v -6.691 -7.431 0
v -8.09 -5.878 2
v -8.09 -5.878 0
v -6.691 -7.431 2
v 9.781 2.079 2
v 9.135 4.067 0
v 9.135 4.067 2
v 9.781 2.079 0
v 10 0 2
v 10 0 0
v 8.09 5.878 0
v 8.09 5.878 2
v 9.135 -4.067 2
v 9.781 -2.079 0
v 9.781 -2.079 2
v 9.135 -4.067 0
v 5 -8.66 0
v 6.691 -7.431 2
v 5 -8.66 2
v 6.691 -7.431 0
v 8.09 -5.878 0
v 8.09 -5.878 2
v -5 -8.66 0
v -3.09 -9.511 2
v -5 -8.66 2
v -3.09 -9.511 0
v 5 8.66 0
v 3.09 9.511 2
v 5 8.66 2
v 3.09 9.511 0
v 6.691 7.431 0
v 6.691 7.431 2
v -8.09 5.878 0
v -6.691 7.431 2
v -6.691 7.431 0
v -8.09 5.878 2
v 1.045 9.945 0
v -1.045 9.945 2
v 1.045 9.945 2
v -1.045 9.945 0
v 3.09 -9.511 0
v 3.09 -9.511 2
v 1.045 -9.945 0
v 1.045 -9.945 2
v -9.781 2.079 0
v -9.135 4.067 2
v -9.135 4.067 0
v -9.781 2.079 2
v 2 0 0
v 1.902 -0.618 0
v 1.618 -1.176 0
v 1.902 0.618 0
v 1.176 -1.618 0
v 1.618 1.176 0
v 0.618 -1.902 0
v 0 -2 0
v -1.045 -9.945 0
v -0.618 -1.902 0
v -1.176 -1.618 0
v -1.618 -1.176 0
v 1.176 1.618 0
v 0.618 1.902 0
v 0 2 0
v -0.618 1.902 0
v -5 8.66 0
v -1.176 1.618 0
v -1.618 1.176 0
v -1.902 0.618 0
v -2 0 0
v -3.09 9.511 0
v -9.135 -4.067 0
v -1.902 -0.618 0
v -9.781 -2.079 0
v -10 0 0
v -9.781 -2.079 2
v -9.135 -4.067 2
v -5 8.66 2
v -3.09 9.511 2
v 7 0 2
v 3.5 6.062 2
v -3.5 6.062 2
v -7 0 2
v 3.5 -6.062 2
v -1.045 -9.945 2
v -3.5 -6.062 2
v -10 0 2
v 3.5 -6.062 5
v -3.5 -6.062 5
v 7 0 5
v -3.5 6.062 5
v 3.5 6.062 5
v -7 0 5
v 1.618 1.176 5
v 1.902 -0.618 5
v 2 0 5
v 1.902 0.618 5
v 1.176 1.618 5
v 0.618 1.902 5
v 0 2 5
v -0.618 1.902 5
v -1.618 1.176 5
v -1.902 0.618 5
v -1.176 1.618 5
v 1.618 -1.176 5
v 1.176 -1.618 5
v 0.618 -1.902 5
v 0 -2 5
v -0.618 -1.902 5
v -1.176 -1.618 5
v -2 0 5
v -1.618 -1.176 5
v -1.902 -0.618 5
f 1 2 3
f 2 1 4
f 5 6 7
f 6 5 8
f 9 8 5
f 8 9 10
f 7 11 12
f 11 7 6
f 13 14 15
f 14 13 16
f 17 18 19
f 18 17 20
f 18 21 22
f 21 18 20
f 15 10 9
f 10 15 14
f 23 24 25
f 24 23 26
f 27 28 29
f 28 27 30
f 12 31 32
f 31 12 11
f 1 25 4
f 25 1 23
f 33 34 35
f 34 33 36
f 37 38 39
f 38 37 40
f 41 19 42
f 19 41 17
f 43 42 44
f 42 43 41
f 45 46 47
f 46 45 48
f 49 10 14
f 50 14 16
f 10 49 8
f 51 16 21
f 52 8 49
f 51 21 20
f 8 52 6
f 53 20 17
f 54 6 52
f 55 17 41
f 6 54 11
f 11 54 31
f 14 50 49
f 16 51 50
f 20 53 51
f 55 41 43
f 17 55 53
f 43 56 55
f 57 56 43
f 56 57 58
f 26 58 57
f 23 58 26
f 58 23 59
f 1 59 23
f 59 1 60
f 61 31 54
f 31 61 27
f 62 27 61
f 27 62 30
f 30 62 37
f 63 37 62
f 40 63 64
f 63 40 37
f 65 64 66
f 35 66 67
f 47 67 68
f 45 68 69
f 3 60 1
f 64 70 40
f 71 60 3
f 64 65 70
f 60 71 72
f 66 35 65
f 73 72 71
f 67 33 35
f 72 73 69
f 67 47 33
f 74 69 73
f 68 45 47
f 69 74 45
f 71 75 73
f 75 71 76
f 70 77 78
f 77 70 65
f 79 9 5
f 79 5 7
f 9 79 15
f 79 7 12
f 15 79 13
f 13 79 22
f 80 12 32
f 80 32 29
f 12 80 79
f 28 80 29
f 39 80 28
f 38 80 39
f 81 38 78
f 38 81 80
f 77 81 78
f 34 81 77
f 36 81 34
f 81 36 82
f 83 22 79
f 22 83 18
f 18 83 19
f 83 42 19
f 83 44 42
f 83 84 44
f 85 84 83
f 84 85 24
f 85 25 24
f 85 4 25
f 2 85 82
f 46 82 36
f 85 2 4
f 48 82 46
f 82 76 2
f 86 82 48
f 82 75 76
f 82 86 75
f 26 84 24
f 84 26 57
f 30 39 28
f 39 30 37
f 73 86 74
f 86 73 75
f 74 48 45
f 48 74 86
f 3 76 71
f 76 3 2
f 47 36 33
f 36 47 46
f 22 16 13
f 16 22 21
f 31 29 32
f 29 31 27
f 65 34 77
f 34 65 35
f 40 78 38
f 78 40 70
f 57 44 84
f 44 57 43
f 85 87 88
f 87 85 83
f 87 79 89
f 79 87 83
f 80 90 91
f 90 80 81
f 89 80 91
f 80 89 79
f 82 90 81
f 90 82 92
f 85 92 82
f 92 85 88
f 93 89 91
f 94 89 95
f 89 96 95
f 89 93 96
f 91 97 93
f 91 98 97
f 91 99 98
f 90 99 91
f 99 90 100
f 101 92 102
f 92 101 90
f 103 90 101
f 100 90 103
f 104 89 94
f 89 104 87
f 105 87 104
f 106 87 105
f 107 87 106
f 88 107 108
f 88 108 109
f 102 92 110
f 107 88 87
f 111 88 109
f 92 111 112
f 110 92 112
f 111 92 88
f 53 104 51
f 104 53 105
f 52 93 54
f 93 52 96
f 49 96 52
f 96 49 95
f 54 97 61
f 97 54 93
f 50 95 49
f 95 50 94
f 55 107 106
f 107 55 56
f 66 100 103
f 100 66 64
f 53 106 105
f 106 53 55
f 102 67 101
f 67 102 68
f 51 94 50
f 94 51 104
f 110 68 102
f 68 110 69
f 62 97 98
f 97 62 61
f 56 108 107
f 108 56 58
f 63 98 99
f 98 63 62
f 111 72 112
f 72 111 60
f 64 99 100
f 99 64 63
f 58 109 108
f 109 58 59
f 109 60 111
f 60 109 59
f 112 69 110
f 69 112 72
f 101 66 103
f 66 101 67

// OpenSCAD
difference(){
union(){
cylinder(r=10,h=2);
cylinder(r=4/2+5,h=5,$fn=6);
}
cylinder(r=4/2,h=15,$fn=20);
}
